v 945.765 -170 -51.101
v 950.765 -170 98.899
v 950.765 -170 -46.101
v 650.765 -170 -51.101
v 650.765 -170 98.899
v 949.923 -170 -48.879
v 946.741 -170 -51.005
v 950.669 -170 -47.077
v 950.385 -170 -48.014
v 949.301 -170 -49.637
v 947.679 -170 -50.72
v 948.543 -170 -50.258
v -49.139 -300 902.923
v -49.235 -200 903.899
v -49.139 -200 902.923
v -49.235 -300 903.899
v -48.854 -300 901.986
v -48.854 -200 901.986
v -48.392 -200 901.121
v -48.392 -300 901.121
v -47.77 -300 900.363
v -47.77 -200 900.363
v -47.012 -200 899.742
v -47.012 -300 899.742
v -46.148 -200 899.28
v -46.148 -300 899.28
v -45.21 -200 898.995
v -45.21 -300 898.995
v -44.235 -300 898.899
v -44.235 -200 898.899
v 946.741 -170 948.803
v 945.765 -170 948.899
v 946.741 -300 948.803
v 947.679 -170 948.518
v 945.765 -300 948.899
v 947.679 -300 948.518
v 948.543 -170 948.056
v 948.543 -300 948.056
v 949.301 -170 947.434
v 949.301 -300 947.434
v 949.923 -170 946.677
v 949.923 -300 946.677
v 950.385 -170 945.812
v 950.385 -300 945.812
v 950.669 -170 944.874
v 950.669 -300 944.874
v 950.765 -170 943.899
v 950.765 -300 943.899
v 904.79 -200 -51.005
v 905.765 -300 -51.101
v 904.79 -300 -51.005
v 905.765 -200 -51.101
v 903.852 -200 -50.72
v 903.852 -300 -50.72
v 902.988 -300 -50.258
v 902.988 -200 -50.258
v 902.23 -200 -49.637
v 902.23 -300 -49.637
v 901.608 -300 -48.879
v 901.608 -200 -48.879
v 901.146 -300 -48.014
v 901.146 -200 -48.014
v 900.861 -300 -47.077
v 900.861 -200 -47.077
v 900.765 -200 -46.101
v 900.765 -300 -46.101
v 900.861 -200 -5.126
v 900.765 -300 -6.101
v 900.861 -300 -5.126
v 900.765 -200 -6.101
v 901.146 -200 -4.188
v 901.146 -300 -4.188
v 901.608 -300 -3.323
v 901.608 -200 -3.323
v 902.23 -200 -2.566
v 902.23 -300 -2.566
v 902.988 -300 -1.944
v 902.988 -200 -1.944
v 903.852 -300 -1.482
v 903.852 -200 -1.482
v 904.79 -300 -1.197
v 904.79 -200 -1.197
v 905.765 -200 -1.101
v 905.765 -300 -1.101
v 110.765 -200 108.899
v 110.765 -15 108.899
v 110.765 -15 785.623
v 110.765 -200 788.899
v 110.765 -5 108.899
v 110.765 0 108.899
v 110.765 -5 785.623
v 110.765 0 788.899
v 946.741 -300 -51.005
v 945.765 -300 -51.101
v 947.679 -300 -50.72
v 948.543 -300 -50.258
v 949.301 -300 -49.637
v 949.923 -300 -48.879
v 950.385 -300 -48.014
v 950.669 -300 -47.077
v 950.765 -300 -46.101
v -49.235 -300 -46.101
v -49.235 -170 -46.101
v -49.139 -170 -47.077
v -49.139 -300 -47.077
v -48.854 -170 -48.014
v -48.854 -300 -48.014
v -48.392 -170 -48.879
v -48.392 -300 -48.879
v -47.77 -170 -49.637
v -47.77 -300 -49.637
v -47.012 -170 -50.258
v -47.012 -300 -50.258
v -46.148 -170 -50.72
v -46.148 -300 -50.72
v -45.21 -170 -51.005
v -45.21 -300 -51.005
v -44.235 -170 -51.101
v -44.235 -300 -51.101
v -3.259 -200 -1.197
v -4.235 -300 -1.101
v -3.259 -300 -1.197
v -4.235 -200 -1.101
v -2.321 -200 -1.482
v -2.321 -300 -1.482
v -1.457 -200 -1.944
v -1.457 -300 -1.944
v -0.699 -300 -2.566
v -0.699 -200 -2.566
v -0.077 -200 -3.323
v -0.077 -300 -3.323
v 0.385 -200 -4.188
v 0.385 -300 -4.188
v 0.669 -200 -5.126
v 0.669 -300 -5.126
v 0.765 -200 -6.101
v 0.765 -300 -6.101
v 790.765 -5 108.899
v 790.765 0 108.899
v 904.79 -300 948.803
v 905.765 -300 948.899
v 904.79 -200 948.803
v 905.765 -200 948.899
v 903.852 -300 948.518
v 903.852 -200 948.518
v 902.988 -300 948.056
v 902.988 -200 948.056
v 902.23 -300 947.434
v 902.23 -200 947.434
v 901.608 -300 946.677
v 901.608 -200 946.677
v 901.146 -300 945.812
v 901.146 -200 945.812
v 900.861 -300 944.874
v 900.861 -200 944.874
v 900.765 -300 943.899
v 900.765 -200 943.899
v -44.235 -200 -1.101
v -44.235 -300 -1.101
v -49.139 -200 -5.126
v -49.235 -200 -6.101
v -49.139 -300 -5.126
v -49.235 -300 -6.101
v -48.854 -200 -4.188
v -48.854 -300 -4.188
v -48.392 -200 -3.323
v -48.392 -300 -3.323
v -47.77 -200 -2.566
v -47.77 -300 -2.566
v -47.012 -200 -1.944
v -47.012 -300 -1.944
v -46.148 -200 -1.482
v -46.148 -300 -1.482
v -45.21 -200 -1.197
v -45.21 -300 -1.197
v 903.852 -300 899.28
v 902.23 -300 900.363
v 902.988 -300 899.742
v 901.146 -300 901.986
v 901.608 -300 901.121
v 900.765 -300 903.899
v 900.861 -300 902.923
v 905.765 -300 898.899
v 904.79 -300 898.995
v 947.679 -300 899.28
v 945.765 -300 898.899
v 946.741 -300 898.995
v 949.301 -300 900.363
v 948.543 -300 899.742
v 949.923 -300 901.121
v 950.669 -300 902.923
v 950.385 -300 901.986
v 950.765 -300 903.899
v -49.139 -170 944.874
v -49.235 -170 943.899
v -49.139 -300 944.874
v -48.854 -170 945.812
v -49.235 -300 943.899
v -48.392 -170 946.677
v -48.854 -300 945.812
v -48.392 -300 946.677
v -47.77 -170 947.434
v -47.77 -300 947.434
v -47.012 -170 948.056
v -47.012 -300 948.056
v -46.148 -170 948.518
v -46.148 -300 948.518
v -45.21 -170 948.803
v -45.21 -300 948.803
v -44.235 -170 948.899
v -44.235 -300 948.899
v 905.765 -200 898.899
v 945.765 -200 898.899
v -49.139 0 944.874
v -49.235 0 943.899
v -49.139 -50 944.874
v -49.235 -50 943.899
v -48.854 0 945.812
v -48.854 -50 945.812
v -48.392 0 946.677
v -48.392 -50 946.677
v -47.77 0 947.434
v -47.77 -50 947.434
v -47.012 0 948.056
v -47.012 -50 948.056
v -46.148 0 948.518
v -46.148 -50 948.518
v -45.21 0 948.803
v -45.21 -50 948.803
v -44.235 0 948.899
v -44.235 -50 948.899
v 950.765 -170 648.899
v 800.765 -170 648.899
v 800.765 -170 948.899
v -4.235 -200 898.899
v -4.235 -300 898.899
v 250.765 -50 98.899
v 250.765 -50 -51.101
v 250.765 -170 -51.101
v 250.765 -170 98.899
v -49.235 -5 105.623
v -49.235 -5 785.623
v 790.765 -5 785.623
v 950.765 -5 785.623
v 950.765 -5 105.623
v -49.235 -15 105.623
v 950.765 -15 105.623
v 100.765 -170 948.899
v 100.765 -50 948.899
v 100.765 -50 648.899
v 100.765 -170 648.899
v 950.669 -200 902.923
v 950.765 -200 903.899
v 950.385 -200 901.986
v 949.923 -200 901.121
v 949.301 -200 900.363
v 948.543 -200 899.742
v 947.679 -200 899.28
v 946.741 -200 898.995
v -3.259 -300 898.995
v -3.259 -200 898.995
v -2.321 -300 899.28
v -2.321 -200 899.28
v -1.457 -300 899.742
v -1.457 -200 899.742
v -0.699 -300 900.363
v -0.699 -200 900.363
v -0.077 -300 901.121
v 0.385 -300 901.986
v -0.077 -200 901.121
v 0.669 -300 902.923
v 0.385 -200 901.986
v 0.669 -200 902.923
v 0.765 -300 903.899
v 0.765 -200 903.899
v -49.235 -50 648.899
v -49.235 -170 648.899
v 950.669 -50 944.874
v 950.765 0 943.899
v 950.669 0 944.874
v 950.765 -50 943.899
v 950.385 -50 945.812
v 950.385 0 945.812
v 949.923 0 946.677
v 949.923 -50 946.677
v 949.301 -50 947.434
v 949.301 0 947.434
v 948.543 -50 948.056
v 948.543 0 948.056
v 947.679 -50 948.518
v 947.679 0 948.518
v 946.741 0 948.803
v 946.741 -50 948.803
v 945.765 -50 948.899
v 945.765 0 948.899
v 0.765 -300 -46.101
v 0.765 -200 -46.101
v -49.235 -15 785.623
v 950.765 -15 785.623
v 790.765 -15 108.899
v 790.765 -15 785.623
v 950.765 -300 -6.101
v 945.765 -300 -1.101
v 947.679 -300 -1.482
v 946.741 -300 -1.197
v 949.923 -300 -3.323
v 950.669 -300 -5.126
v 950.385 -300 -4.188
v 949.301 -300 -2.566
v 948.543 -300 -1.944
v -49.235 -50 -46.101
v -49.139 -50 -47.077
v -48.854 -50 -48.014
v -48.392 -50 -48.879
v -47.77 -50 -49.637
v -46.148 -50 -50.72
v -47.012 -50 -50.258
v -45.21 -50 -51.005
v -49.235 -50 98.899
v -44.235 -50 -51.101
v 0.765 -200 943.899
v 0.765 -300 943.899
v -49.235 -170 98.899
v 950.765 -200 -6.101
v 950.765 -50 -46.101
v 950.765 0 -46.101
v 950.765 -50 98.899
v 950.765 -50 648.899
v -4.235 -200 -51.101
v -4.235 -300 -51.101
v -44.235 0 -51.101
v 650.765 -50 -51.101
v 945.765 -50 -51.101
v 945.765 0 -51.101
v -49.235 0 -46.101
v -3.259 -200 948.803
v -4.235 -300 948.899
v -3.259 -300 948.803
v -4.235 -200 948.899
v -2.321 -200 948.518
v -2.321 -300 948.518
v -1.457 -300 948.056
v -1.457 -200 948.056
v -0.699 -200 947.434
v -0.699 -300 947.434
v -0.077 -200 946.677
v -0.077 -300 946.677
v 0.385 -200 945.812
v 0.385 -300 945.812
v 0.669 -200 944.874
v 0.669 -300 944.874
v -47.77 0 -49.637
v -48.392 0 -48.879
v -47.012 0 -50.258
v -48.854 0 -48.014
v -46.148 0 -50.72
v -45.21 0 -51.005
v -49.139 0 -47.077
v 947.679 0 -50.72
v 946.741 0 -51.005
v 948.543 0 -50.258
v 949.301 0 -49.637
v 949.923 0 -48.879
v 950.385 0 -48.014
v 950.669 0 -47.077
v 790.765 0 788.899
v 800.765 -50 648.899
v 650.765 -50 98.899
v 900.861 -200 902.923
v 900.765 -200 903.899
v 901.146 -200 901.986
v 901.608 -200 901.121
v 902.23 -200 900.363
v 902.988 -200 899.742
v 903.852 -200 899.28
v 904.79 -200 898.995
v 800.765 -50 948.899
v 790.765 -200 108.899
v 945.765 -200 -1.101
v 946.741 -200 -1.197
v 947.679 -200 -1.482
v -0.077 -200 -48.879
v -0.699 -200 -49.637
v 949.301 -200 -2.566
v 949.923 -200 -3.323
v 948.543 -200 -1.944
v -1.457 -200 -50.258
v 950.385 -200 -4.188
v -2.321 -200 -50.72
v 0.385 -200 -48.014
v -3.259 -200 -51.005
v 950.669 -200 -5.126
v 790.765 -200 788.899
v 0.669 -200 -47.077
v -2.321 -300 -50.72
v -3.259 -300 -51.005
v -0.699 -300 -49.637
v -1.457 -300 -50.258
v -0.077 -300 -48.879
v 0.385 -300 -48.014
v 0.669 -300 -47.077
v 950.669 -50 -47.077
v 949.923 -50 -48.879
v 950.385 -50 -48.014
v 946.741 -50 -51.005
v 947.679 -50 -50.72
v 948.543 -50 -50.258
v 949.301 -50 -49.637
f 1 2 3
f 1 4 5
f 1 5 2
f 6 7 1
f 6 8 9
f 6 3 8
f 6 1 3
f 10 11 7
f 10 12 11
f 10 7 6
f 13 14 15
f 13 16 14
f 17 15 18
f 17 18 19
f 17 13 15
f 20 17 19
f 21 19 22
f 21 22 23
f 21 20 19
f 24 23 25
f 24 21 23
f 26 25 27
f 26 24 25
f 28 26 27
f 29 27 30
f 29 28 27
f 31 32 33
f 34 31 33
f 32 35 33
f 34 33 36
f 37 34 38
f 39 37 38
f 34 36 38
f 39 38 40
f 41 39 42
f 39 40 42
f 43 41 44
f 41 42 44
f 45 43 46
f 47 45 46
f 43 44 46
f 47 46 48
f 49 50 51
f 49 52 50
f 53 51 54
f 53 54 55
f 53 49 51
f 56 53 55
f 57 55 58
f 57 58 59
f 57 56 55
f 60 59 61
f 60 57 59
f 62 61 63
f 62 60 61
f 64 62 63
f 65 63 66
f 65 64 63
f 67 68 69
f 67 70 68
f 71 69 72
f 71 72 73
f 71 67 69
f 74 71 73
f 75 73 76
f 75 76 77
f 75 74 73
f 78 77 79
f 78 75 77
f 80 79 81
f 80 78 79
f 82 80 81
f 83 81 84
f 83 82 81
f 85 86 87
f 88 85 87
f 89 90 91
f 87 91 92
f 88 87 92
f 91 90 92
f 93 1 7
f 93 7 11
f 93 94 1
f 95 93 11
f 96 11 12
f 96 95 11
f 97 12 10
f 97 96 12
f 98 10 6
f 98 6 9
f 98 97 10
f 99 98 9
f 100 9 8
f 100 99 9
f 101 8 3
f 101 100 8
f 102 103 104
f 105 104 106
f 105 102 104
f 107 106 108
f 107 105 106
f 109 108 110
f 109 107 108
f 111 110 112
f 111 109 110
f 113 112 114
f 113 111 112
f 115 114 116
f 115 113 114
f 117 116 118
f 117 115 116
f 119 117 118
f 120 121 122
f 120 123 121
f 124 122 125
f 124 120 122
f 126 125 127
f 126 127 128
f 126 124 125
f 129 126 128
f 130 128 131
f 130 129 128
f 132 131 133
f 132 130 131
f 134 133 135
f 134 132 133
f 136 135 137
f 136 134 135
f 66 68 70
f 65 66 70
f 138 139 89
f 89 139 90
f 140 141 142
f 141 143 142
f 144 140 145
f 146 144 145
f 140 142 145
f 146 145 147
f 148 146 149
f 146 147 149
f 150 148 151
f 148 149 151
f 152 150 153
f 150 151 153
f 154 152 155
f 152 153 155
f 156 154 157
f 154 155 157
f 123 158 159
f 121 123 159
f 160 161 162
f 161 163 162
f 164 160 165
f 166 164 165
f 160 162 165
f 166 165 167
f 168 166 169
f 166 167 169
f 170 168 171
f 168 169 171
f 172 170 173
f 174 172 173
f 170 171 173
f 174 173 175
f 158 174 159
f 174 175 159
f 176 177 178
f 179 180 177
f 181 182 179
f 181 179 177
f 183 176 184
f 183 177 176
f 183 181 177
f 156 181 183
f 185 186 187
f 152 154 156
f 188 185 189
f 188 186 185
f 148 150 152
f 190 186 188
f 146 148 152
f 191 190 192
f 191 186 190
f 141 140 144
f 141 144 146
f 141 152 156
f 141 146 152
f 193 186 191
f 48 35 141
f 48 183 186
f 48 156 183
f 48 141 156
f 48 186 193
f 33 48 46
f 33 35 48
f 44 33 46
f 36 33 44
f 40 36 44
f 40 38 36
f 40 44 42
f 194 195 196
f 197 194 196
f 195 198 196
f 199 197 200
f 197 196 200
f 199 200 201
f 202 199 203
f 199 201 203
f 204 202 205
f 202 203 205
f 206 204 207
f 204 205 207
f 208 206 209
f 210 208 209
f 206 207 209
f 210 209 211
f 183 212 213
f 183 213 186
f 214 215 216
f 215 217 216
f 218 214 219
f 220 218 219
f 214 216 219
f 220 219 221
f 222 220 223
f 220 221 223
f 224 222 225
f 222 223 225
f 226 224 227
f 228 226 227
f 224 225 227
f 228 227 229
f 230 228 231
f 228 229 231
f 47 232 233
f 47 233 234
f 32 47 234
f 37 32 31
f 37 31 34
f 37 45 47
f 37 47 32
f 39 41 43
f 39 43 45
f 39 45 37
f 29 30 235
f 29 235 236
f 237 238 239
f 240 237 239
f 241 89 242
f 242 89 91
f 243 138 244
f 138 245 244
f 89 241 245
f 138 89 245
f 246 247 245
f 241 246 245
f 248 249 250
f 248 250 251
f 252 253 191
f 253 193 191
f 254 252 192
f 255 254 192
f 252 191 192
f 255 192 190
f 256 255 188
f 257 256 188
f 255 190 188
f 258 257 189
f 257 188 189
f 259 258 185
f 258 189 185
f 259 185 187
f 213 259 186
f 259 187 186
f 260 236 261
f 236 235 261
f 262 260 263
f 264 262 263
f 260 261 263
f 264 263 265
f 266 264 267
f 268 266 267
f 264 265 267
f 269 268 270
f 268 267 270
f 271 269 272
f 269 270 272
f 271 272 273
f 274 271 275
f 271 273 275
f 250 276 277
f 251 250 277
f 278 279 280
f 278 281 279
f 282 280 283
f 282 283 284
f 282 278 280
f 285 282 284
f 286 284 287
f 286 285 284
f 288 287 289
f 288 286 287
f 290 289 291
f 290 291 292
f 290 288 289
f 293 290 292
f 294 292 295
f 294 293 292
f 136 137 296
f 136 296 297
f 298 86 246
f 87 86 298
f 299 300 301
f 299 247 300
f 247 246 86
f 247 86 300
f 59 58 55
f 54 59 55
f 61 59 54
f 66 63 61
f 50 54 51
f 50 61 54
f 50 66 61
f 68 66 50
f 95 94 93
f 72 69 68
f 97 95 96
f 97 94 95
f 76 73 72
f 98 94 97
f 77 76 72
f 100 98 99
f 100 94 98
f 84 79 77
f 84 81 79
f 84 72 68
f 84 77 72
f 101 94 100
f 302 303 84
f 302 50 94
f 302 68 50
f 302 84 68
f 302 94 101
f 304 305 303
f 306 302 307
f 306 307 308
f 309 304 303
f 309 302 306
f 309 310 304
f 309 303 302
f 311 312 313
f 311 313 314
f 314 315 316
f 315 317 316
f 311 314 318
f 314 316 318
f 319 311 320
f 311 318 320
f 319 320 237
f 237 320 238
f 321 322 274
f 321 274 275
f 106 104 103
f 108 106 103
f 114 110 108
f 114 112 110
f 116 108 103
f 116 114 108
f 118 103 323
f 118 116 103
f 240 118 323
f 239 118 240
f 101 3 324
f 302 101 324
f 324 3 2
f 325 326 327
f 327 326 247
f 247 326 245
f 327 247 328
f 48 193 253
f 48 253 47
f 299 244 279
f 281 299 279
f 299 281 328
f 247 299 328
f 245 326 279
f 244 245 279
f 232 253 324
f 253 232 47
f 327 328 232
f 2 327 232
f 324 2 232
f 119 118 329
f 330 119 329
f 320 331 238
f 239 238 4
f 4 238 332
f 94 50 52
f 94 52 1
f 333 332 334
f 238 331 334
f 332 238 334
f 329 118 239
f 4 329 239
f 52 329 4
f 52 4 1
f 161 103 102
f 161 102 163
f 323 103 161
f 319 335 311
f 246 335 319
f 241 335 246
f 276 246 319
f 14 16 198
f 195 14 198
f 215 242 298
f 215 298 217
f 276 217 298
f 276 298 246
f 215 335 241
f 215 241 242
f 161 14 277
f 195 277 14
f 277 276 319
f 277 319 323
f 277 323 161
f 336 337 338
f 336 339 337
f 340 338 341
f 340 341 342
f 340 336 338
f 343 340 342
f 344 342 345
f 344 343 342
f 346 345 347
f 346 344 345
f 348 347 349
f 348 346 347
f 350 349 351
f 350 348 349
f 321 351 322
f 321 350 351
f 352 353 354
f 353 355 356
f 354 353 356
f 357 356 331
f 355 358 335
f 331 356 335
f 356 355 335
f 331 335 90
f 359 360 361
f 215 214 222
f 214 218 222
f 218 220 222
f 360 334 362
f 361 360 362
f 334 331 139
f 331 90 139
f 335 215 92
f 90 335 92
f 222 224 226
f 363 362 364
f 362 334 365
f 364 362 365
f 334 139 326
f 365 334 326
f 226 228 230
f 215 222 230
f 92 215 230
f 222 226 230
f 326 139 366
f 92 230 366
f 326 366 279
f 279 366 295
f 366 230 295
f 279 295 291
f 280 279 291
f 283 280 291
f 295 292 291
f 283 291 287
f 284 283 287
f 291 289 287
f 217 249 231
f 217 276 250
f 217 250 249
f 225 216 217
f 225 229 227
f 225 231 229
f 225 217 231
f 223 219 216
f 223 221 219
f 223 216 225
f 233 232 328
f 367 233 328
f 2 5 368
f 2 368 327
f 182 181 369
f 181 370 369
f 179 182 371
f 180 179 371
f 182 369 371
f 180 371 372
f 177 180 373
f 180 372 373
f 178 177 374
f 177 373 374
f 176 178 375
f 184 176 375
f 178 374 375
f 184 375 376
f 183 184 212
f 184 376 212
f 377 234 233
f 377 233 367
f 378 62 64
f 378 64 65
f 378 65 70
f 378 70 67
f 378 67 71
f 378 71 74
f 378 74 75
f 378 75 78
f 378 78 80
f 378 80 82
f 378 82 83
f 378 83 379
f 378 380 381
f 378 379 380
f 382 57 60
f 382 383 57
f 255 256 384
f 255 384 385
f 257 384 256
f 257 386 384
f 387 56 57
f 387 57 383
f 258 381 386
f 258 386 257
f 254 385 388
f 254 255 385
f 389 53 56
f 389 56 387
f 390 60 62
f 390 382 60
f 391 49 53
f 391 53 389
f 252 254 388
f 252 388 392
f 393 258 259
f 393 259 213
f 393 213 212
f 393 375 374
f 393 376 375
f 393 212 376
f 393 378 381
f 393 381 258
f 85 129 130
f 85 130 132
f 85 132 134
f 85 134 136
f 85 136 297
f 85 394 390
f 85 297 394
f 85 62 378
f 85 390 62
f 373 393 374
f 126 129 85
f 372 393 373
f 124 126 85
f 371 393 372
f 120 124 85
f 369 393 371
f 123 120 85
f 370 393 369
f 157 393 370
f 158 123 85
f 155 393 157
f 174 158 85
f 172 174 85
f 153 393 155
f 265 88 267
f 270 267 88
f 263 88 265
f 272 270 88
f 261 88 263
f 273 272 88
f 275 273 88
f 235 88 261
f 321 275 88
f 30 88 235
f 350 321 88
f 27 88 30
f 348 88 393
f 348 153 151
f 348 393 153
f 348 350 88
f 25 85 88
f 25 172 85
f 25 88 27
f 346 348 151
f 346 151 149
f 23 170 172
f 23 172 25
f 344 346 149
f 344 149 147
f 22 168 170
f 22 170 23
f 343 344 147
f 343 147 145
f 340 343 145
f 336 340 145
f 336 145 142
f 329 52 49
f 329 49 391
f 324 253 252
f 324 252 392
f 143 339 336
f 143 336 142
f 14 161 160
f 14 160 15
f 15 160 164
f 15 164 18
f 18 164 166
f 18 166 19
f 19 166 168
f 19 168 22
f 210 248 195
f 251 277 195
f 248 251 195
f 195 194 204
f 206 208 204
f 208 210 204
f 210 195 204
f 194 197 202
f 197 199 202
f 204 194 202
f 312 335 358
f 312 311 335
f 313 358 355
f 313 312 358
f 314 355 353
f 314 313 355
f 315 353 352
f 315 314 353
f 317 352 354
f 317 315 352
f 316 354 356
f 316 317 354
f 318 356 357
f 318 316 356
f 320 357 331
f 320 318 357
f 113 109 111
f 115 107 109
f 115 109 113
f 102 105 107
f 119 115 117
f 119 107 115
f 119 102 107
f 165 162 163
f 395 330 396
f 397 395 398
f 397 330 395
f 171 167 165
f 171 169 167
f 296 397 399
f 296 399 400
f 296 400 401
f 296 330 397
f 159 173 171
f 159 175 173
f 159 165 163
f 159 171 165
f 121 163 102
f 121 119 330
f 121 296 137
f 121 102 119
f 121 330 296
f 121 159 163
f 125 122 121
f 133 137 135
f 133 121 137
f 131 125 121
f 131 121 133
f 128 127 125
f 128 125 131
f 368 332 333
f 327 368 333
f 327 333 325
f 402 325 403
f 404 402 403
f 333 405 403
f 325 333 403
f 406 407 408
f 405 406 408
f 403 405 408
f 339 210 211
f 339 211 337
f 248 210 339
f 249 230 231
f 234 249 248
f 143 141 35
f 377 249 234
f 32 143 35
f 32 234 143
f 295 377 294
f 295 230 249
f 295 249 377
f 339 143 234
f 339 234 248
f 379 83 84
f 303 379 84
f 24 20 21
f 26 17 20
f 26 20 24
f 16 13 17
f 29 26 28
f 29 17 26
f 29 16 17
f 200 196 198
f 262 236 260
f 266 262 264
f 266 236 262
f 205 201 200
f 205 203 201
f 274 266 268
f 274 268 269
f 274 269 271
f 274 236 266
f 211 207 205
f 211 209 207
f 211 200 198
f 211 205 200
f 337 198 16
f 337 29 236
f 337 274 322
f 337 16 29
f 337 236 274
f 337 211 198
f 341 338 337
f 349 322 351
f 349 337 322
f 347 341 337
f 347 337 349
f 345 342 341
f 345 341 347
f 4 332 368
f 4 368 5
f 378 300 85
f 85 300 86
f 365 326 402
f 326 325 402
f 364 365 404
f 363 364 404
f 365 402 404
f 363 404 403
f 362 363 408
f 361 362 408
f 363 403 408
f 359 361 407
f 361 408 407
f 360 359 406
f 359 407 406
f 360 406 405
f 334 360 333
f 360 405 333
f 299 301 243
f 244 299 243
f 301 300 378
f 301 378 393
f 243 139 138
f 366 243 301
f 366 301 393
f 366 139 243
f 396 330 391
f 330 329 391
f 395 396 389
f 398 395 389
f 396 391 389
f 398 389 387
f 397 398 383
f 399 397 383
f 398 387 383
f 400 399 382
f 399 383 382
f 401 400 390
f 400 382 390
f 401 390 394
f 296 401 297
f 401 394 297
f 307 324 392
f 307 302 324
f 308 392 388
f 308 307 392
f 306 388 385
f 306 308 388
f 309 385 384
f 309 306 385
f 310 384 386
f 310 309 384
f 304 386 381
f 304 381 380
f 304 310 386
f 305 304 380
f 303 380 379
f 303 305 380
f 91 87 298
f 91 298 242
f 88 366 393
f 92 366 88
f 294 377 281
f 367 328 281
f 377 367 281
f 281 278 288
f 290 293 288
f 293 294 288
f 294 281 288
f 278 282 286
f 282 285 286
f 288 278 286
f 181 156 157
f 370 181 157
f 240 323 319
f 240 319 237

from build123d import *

# Parameters (mm, degrees)
F0_W      = 1000
F0_H      = 1000
F1_DEPTH  = 300
F2_W      = 900
F2_H      = 100
F3_DEPTH  = 1000.001
F4_W      = 100
F4_H      = 900
F5_DEPTH  = 1000.001
F6_W      = 300
F6_H      = 120
F7_DEPTH  = 150
F8_W      = 300
F8_H      = 120
F9_DEPTH  = 150
F10_W     = 120
F10_H     = 300
F11_DEPTH = 150
F12_W     = 120
F12_H     = 300
F13_DEPTH = 150
F14_R     = 5
F15_R     = 5
F16_W     = 680
F16_H     = 680
F17_DEPTH = 300.001
F18_W     = 10
F18_H     = 680
F19_DEPTH = 160.001
F20_DEPTH = 840.001


with BuildPart() as f1:
    # F0 (on Front) → F1 (new body)
    with BuildSketch(Plane.XZ):
        with Locations((450.7653813809, 448.8989327101)):
            Rectangle(F0_W, F0_H)
    extrude(amount=F1_DEPTH)

    # F2 (on face) → F3 (cut, through all)
    with BuildSketch(Plane.XY.offset(948.8989327101)):
        with Locations((450.7653813809, -250)):
            Rectangle(F2_W, F2_H)
    extrude(amount=-F3_DEPTH, mode=Mode.SUBTRACT)

    # F4 (on face) → F5 (cut, through all)
    with BuildSketch(Plane(origin=(-49.2346186191, 0, 0), x_dir=(0, -1, 0), z_dir=(-1, 0, 0))):
        with Locations((250, 448.8989327101)):
            Rectangle(F4_W, F4_H)
    extrude(amount=-F5_DEPTH, mode=Mode.SUBTRACT)

    # F6 (on face) → F7 (cut)
    with BuildSketch(Plane(origin=(0, 0, -51.1010672899), x_dir=(1, 0, 0), z_dir=(0, 0, -1))):
        with Locations((100.7653813809, 110)):
            Rectangle(F6_W, F6_H)
    extrude(amount=-F7_DEPTH, mode=Mode.SUBTRACT)

    # F8 (on face) → F9 (cut)
    with BuildSketch(Plane(origin=(0, 0, -51.1010672899), x_dir=(1, 0, 0), z_dir=(0, 0, -1))):
        with Locations((800.7653813809, 110)):
            Rectangle(F8_W, F8_H)
    extrude(amount=-F9_DEPTH, mode=Mode.SUBTRACT)

    # F10 (on face) → F11 (cut)
    with BuildSketch(Plane.YZ.offset(950.7653813809)):
        with Locations((-110, 798.8989327101)):
            Rectangle(F10_W, F10_H)
    extrude(amount=-F11_DEPTH, mode=Mode.SUBTRACT)

    # F12 (on face) → F13 (cut)
    with BuildSketch(Plane(origin=(-49.2346186191, 0, 0), x_dir=(0, -1, 0), z_dir=(-1, 0, 0))):
        with Locations((110, 798.8989327101)):
            Rectangle(F12_W, F12_H)
    extrude(amount=-F13_DEPTH, mode=Mode.SUBTRACT)

    # F14
    f14_edges = [f1.edges().sort_by_distance(p)[0] for p in [
        (950.765381, -235, -51.101067),
        (900.765381, -250, -51.101067),
        (950.765381, -250, -1.101067),
        (900.765381, -250, -1.101067),
        (-49.234619, -235, -51.101067),
        (0.765381, -250, -51.101067),
        (-49.234619, -250, -1.101067),
        (0.765381, -250, -1.101067),
        (-49.234619, -235, 948.898933),
        (0.765381, -250, 948.898933),
        (-49.234619, -250, 898.898933),
        (0.765381, -250, 898.898933),
        (950.765381, -235, 948.898933),
        (950.765381, -250, 898.898933),
        (900.765381, -250, 898.898933),
        (900.765381, -250, 948.898933),
    ]]
    fillet(f14_edges, radius=F14_R)

    # F15
    f15_edges = [f1.edges().sort_by_distance(p)[0] for p in [
        (950.765381, -25, 948.898933),
        (950.765381, -25, -51.101067),
        (-49.234619, -25, -51.101067),
        (-49.234619, -25, 948.898933),
    ]]
    fillet(f15_edges, radius=F15_R)

    # F16 (on face) → F17 (cut, through all)
    with BuildSketch(Plane(origin=(0, 0, 0), x_dir=(-1, 0, 0), z_dir=(0, 1, 0))):
        with Locations((-450.7653813809, 448.8989327101)):
            Rectangle(F16_W, F16_H)
    extrude(amount=-F17_DEPTH, mode=Mode.SUBTRACT)

    # F18 (on face) → F19 (cut, through all)
    with BuildSketch(Plane.YZ.offset(110.7653813809)):
        with Locations((-10, 445.622831583)):
            Rectangle(F18_W, F18_H)
    extrude(amount=-F19_DEPTH, mode=Mode.SUBTRACT)

    # F18 (on face) → F20 (cut, through all)
    with BuildSketch(Plane.YZ.offset(110.7653813809)):
        with Locations((-10, 445.622831583)):
            Rectangle(F18_W, F18_H)
    extrude(amount=F20_DEPTH, mode=Mode.SUBTRACT)


solid = f1.part
